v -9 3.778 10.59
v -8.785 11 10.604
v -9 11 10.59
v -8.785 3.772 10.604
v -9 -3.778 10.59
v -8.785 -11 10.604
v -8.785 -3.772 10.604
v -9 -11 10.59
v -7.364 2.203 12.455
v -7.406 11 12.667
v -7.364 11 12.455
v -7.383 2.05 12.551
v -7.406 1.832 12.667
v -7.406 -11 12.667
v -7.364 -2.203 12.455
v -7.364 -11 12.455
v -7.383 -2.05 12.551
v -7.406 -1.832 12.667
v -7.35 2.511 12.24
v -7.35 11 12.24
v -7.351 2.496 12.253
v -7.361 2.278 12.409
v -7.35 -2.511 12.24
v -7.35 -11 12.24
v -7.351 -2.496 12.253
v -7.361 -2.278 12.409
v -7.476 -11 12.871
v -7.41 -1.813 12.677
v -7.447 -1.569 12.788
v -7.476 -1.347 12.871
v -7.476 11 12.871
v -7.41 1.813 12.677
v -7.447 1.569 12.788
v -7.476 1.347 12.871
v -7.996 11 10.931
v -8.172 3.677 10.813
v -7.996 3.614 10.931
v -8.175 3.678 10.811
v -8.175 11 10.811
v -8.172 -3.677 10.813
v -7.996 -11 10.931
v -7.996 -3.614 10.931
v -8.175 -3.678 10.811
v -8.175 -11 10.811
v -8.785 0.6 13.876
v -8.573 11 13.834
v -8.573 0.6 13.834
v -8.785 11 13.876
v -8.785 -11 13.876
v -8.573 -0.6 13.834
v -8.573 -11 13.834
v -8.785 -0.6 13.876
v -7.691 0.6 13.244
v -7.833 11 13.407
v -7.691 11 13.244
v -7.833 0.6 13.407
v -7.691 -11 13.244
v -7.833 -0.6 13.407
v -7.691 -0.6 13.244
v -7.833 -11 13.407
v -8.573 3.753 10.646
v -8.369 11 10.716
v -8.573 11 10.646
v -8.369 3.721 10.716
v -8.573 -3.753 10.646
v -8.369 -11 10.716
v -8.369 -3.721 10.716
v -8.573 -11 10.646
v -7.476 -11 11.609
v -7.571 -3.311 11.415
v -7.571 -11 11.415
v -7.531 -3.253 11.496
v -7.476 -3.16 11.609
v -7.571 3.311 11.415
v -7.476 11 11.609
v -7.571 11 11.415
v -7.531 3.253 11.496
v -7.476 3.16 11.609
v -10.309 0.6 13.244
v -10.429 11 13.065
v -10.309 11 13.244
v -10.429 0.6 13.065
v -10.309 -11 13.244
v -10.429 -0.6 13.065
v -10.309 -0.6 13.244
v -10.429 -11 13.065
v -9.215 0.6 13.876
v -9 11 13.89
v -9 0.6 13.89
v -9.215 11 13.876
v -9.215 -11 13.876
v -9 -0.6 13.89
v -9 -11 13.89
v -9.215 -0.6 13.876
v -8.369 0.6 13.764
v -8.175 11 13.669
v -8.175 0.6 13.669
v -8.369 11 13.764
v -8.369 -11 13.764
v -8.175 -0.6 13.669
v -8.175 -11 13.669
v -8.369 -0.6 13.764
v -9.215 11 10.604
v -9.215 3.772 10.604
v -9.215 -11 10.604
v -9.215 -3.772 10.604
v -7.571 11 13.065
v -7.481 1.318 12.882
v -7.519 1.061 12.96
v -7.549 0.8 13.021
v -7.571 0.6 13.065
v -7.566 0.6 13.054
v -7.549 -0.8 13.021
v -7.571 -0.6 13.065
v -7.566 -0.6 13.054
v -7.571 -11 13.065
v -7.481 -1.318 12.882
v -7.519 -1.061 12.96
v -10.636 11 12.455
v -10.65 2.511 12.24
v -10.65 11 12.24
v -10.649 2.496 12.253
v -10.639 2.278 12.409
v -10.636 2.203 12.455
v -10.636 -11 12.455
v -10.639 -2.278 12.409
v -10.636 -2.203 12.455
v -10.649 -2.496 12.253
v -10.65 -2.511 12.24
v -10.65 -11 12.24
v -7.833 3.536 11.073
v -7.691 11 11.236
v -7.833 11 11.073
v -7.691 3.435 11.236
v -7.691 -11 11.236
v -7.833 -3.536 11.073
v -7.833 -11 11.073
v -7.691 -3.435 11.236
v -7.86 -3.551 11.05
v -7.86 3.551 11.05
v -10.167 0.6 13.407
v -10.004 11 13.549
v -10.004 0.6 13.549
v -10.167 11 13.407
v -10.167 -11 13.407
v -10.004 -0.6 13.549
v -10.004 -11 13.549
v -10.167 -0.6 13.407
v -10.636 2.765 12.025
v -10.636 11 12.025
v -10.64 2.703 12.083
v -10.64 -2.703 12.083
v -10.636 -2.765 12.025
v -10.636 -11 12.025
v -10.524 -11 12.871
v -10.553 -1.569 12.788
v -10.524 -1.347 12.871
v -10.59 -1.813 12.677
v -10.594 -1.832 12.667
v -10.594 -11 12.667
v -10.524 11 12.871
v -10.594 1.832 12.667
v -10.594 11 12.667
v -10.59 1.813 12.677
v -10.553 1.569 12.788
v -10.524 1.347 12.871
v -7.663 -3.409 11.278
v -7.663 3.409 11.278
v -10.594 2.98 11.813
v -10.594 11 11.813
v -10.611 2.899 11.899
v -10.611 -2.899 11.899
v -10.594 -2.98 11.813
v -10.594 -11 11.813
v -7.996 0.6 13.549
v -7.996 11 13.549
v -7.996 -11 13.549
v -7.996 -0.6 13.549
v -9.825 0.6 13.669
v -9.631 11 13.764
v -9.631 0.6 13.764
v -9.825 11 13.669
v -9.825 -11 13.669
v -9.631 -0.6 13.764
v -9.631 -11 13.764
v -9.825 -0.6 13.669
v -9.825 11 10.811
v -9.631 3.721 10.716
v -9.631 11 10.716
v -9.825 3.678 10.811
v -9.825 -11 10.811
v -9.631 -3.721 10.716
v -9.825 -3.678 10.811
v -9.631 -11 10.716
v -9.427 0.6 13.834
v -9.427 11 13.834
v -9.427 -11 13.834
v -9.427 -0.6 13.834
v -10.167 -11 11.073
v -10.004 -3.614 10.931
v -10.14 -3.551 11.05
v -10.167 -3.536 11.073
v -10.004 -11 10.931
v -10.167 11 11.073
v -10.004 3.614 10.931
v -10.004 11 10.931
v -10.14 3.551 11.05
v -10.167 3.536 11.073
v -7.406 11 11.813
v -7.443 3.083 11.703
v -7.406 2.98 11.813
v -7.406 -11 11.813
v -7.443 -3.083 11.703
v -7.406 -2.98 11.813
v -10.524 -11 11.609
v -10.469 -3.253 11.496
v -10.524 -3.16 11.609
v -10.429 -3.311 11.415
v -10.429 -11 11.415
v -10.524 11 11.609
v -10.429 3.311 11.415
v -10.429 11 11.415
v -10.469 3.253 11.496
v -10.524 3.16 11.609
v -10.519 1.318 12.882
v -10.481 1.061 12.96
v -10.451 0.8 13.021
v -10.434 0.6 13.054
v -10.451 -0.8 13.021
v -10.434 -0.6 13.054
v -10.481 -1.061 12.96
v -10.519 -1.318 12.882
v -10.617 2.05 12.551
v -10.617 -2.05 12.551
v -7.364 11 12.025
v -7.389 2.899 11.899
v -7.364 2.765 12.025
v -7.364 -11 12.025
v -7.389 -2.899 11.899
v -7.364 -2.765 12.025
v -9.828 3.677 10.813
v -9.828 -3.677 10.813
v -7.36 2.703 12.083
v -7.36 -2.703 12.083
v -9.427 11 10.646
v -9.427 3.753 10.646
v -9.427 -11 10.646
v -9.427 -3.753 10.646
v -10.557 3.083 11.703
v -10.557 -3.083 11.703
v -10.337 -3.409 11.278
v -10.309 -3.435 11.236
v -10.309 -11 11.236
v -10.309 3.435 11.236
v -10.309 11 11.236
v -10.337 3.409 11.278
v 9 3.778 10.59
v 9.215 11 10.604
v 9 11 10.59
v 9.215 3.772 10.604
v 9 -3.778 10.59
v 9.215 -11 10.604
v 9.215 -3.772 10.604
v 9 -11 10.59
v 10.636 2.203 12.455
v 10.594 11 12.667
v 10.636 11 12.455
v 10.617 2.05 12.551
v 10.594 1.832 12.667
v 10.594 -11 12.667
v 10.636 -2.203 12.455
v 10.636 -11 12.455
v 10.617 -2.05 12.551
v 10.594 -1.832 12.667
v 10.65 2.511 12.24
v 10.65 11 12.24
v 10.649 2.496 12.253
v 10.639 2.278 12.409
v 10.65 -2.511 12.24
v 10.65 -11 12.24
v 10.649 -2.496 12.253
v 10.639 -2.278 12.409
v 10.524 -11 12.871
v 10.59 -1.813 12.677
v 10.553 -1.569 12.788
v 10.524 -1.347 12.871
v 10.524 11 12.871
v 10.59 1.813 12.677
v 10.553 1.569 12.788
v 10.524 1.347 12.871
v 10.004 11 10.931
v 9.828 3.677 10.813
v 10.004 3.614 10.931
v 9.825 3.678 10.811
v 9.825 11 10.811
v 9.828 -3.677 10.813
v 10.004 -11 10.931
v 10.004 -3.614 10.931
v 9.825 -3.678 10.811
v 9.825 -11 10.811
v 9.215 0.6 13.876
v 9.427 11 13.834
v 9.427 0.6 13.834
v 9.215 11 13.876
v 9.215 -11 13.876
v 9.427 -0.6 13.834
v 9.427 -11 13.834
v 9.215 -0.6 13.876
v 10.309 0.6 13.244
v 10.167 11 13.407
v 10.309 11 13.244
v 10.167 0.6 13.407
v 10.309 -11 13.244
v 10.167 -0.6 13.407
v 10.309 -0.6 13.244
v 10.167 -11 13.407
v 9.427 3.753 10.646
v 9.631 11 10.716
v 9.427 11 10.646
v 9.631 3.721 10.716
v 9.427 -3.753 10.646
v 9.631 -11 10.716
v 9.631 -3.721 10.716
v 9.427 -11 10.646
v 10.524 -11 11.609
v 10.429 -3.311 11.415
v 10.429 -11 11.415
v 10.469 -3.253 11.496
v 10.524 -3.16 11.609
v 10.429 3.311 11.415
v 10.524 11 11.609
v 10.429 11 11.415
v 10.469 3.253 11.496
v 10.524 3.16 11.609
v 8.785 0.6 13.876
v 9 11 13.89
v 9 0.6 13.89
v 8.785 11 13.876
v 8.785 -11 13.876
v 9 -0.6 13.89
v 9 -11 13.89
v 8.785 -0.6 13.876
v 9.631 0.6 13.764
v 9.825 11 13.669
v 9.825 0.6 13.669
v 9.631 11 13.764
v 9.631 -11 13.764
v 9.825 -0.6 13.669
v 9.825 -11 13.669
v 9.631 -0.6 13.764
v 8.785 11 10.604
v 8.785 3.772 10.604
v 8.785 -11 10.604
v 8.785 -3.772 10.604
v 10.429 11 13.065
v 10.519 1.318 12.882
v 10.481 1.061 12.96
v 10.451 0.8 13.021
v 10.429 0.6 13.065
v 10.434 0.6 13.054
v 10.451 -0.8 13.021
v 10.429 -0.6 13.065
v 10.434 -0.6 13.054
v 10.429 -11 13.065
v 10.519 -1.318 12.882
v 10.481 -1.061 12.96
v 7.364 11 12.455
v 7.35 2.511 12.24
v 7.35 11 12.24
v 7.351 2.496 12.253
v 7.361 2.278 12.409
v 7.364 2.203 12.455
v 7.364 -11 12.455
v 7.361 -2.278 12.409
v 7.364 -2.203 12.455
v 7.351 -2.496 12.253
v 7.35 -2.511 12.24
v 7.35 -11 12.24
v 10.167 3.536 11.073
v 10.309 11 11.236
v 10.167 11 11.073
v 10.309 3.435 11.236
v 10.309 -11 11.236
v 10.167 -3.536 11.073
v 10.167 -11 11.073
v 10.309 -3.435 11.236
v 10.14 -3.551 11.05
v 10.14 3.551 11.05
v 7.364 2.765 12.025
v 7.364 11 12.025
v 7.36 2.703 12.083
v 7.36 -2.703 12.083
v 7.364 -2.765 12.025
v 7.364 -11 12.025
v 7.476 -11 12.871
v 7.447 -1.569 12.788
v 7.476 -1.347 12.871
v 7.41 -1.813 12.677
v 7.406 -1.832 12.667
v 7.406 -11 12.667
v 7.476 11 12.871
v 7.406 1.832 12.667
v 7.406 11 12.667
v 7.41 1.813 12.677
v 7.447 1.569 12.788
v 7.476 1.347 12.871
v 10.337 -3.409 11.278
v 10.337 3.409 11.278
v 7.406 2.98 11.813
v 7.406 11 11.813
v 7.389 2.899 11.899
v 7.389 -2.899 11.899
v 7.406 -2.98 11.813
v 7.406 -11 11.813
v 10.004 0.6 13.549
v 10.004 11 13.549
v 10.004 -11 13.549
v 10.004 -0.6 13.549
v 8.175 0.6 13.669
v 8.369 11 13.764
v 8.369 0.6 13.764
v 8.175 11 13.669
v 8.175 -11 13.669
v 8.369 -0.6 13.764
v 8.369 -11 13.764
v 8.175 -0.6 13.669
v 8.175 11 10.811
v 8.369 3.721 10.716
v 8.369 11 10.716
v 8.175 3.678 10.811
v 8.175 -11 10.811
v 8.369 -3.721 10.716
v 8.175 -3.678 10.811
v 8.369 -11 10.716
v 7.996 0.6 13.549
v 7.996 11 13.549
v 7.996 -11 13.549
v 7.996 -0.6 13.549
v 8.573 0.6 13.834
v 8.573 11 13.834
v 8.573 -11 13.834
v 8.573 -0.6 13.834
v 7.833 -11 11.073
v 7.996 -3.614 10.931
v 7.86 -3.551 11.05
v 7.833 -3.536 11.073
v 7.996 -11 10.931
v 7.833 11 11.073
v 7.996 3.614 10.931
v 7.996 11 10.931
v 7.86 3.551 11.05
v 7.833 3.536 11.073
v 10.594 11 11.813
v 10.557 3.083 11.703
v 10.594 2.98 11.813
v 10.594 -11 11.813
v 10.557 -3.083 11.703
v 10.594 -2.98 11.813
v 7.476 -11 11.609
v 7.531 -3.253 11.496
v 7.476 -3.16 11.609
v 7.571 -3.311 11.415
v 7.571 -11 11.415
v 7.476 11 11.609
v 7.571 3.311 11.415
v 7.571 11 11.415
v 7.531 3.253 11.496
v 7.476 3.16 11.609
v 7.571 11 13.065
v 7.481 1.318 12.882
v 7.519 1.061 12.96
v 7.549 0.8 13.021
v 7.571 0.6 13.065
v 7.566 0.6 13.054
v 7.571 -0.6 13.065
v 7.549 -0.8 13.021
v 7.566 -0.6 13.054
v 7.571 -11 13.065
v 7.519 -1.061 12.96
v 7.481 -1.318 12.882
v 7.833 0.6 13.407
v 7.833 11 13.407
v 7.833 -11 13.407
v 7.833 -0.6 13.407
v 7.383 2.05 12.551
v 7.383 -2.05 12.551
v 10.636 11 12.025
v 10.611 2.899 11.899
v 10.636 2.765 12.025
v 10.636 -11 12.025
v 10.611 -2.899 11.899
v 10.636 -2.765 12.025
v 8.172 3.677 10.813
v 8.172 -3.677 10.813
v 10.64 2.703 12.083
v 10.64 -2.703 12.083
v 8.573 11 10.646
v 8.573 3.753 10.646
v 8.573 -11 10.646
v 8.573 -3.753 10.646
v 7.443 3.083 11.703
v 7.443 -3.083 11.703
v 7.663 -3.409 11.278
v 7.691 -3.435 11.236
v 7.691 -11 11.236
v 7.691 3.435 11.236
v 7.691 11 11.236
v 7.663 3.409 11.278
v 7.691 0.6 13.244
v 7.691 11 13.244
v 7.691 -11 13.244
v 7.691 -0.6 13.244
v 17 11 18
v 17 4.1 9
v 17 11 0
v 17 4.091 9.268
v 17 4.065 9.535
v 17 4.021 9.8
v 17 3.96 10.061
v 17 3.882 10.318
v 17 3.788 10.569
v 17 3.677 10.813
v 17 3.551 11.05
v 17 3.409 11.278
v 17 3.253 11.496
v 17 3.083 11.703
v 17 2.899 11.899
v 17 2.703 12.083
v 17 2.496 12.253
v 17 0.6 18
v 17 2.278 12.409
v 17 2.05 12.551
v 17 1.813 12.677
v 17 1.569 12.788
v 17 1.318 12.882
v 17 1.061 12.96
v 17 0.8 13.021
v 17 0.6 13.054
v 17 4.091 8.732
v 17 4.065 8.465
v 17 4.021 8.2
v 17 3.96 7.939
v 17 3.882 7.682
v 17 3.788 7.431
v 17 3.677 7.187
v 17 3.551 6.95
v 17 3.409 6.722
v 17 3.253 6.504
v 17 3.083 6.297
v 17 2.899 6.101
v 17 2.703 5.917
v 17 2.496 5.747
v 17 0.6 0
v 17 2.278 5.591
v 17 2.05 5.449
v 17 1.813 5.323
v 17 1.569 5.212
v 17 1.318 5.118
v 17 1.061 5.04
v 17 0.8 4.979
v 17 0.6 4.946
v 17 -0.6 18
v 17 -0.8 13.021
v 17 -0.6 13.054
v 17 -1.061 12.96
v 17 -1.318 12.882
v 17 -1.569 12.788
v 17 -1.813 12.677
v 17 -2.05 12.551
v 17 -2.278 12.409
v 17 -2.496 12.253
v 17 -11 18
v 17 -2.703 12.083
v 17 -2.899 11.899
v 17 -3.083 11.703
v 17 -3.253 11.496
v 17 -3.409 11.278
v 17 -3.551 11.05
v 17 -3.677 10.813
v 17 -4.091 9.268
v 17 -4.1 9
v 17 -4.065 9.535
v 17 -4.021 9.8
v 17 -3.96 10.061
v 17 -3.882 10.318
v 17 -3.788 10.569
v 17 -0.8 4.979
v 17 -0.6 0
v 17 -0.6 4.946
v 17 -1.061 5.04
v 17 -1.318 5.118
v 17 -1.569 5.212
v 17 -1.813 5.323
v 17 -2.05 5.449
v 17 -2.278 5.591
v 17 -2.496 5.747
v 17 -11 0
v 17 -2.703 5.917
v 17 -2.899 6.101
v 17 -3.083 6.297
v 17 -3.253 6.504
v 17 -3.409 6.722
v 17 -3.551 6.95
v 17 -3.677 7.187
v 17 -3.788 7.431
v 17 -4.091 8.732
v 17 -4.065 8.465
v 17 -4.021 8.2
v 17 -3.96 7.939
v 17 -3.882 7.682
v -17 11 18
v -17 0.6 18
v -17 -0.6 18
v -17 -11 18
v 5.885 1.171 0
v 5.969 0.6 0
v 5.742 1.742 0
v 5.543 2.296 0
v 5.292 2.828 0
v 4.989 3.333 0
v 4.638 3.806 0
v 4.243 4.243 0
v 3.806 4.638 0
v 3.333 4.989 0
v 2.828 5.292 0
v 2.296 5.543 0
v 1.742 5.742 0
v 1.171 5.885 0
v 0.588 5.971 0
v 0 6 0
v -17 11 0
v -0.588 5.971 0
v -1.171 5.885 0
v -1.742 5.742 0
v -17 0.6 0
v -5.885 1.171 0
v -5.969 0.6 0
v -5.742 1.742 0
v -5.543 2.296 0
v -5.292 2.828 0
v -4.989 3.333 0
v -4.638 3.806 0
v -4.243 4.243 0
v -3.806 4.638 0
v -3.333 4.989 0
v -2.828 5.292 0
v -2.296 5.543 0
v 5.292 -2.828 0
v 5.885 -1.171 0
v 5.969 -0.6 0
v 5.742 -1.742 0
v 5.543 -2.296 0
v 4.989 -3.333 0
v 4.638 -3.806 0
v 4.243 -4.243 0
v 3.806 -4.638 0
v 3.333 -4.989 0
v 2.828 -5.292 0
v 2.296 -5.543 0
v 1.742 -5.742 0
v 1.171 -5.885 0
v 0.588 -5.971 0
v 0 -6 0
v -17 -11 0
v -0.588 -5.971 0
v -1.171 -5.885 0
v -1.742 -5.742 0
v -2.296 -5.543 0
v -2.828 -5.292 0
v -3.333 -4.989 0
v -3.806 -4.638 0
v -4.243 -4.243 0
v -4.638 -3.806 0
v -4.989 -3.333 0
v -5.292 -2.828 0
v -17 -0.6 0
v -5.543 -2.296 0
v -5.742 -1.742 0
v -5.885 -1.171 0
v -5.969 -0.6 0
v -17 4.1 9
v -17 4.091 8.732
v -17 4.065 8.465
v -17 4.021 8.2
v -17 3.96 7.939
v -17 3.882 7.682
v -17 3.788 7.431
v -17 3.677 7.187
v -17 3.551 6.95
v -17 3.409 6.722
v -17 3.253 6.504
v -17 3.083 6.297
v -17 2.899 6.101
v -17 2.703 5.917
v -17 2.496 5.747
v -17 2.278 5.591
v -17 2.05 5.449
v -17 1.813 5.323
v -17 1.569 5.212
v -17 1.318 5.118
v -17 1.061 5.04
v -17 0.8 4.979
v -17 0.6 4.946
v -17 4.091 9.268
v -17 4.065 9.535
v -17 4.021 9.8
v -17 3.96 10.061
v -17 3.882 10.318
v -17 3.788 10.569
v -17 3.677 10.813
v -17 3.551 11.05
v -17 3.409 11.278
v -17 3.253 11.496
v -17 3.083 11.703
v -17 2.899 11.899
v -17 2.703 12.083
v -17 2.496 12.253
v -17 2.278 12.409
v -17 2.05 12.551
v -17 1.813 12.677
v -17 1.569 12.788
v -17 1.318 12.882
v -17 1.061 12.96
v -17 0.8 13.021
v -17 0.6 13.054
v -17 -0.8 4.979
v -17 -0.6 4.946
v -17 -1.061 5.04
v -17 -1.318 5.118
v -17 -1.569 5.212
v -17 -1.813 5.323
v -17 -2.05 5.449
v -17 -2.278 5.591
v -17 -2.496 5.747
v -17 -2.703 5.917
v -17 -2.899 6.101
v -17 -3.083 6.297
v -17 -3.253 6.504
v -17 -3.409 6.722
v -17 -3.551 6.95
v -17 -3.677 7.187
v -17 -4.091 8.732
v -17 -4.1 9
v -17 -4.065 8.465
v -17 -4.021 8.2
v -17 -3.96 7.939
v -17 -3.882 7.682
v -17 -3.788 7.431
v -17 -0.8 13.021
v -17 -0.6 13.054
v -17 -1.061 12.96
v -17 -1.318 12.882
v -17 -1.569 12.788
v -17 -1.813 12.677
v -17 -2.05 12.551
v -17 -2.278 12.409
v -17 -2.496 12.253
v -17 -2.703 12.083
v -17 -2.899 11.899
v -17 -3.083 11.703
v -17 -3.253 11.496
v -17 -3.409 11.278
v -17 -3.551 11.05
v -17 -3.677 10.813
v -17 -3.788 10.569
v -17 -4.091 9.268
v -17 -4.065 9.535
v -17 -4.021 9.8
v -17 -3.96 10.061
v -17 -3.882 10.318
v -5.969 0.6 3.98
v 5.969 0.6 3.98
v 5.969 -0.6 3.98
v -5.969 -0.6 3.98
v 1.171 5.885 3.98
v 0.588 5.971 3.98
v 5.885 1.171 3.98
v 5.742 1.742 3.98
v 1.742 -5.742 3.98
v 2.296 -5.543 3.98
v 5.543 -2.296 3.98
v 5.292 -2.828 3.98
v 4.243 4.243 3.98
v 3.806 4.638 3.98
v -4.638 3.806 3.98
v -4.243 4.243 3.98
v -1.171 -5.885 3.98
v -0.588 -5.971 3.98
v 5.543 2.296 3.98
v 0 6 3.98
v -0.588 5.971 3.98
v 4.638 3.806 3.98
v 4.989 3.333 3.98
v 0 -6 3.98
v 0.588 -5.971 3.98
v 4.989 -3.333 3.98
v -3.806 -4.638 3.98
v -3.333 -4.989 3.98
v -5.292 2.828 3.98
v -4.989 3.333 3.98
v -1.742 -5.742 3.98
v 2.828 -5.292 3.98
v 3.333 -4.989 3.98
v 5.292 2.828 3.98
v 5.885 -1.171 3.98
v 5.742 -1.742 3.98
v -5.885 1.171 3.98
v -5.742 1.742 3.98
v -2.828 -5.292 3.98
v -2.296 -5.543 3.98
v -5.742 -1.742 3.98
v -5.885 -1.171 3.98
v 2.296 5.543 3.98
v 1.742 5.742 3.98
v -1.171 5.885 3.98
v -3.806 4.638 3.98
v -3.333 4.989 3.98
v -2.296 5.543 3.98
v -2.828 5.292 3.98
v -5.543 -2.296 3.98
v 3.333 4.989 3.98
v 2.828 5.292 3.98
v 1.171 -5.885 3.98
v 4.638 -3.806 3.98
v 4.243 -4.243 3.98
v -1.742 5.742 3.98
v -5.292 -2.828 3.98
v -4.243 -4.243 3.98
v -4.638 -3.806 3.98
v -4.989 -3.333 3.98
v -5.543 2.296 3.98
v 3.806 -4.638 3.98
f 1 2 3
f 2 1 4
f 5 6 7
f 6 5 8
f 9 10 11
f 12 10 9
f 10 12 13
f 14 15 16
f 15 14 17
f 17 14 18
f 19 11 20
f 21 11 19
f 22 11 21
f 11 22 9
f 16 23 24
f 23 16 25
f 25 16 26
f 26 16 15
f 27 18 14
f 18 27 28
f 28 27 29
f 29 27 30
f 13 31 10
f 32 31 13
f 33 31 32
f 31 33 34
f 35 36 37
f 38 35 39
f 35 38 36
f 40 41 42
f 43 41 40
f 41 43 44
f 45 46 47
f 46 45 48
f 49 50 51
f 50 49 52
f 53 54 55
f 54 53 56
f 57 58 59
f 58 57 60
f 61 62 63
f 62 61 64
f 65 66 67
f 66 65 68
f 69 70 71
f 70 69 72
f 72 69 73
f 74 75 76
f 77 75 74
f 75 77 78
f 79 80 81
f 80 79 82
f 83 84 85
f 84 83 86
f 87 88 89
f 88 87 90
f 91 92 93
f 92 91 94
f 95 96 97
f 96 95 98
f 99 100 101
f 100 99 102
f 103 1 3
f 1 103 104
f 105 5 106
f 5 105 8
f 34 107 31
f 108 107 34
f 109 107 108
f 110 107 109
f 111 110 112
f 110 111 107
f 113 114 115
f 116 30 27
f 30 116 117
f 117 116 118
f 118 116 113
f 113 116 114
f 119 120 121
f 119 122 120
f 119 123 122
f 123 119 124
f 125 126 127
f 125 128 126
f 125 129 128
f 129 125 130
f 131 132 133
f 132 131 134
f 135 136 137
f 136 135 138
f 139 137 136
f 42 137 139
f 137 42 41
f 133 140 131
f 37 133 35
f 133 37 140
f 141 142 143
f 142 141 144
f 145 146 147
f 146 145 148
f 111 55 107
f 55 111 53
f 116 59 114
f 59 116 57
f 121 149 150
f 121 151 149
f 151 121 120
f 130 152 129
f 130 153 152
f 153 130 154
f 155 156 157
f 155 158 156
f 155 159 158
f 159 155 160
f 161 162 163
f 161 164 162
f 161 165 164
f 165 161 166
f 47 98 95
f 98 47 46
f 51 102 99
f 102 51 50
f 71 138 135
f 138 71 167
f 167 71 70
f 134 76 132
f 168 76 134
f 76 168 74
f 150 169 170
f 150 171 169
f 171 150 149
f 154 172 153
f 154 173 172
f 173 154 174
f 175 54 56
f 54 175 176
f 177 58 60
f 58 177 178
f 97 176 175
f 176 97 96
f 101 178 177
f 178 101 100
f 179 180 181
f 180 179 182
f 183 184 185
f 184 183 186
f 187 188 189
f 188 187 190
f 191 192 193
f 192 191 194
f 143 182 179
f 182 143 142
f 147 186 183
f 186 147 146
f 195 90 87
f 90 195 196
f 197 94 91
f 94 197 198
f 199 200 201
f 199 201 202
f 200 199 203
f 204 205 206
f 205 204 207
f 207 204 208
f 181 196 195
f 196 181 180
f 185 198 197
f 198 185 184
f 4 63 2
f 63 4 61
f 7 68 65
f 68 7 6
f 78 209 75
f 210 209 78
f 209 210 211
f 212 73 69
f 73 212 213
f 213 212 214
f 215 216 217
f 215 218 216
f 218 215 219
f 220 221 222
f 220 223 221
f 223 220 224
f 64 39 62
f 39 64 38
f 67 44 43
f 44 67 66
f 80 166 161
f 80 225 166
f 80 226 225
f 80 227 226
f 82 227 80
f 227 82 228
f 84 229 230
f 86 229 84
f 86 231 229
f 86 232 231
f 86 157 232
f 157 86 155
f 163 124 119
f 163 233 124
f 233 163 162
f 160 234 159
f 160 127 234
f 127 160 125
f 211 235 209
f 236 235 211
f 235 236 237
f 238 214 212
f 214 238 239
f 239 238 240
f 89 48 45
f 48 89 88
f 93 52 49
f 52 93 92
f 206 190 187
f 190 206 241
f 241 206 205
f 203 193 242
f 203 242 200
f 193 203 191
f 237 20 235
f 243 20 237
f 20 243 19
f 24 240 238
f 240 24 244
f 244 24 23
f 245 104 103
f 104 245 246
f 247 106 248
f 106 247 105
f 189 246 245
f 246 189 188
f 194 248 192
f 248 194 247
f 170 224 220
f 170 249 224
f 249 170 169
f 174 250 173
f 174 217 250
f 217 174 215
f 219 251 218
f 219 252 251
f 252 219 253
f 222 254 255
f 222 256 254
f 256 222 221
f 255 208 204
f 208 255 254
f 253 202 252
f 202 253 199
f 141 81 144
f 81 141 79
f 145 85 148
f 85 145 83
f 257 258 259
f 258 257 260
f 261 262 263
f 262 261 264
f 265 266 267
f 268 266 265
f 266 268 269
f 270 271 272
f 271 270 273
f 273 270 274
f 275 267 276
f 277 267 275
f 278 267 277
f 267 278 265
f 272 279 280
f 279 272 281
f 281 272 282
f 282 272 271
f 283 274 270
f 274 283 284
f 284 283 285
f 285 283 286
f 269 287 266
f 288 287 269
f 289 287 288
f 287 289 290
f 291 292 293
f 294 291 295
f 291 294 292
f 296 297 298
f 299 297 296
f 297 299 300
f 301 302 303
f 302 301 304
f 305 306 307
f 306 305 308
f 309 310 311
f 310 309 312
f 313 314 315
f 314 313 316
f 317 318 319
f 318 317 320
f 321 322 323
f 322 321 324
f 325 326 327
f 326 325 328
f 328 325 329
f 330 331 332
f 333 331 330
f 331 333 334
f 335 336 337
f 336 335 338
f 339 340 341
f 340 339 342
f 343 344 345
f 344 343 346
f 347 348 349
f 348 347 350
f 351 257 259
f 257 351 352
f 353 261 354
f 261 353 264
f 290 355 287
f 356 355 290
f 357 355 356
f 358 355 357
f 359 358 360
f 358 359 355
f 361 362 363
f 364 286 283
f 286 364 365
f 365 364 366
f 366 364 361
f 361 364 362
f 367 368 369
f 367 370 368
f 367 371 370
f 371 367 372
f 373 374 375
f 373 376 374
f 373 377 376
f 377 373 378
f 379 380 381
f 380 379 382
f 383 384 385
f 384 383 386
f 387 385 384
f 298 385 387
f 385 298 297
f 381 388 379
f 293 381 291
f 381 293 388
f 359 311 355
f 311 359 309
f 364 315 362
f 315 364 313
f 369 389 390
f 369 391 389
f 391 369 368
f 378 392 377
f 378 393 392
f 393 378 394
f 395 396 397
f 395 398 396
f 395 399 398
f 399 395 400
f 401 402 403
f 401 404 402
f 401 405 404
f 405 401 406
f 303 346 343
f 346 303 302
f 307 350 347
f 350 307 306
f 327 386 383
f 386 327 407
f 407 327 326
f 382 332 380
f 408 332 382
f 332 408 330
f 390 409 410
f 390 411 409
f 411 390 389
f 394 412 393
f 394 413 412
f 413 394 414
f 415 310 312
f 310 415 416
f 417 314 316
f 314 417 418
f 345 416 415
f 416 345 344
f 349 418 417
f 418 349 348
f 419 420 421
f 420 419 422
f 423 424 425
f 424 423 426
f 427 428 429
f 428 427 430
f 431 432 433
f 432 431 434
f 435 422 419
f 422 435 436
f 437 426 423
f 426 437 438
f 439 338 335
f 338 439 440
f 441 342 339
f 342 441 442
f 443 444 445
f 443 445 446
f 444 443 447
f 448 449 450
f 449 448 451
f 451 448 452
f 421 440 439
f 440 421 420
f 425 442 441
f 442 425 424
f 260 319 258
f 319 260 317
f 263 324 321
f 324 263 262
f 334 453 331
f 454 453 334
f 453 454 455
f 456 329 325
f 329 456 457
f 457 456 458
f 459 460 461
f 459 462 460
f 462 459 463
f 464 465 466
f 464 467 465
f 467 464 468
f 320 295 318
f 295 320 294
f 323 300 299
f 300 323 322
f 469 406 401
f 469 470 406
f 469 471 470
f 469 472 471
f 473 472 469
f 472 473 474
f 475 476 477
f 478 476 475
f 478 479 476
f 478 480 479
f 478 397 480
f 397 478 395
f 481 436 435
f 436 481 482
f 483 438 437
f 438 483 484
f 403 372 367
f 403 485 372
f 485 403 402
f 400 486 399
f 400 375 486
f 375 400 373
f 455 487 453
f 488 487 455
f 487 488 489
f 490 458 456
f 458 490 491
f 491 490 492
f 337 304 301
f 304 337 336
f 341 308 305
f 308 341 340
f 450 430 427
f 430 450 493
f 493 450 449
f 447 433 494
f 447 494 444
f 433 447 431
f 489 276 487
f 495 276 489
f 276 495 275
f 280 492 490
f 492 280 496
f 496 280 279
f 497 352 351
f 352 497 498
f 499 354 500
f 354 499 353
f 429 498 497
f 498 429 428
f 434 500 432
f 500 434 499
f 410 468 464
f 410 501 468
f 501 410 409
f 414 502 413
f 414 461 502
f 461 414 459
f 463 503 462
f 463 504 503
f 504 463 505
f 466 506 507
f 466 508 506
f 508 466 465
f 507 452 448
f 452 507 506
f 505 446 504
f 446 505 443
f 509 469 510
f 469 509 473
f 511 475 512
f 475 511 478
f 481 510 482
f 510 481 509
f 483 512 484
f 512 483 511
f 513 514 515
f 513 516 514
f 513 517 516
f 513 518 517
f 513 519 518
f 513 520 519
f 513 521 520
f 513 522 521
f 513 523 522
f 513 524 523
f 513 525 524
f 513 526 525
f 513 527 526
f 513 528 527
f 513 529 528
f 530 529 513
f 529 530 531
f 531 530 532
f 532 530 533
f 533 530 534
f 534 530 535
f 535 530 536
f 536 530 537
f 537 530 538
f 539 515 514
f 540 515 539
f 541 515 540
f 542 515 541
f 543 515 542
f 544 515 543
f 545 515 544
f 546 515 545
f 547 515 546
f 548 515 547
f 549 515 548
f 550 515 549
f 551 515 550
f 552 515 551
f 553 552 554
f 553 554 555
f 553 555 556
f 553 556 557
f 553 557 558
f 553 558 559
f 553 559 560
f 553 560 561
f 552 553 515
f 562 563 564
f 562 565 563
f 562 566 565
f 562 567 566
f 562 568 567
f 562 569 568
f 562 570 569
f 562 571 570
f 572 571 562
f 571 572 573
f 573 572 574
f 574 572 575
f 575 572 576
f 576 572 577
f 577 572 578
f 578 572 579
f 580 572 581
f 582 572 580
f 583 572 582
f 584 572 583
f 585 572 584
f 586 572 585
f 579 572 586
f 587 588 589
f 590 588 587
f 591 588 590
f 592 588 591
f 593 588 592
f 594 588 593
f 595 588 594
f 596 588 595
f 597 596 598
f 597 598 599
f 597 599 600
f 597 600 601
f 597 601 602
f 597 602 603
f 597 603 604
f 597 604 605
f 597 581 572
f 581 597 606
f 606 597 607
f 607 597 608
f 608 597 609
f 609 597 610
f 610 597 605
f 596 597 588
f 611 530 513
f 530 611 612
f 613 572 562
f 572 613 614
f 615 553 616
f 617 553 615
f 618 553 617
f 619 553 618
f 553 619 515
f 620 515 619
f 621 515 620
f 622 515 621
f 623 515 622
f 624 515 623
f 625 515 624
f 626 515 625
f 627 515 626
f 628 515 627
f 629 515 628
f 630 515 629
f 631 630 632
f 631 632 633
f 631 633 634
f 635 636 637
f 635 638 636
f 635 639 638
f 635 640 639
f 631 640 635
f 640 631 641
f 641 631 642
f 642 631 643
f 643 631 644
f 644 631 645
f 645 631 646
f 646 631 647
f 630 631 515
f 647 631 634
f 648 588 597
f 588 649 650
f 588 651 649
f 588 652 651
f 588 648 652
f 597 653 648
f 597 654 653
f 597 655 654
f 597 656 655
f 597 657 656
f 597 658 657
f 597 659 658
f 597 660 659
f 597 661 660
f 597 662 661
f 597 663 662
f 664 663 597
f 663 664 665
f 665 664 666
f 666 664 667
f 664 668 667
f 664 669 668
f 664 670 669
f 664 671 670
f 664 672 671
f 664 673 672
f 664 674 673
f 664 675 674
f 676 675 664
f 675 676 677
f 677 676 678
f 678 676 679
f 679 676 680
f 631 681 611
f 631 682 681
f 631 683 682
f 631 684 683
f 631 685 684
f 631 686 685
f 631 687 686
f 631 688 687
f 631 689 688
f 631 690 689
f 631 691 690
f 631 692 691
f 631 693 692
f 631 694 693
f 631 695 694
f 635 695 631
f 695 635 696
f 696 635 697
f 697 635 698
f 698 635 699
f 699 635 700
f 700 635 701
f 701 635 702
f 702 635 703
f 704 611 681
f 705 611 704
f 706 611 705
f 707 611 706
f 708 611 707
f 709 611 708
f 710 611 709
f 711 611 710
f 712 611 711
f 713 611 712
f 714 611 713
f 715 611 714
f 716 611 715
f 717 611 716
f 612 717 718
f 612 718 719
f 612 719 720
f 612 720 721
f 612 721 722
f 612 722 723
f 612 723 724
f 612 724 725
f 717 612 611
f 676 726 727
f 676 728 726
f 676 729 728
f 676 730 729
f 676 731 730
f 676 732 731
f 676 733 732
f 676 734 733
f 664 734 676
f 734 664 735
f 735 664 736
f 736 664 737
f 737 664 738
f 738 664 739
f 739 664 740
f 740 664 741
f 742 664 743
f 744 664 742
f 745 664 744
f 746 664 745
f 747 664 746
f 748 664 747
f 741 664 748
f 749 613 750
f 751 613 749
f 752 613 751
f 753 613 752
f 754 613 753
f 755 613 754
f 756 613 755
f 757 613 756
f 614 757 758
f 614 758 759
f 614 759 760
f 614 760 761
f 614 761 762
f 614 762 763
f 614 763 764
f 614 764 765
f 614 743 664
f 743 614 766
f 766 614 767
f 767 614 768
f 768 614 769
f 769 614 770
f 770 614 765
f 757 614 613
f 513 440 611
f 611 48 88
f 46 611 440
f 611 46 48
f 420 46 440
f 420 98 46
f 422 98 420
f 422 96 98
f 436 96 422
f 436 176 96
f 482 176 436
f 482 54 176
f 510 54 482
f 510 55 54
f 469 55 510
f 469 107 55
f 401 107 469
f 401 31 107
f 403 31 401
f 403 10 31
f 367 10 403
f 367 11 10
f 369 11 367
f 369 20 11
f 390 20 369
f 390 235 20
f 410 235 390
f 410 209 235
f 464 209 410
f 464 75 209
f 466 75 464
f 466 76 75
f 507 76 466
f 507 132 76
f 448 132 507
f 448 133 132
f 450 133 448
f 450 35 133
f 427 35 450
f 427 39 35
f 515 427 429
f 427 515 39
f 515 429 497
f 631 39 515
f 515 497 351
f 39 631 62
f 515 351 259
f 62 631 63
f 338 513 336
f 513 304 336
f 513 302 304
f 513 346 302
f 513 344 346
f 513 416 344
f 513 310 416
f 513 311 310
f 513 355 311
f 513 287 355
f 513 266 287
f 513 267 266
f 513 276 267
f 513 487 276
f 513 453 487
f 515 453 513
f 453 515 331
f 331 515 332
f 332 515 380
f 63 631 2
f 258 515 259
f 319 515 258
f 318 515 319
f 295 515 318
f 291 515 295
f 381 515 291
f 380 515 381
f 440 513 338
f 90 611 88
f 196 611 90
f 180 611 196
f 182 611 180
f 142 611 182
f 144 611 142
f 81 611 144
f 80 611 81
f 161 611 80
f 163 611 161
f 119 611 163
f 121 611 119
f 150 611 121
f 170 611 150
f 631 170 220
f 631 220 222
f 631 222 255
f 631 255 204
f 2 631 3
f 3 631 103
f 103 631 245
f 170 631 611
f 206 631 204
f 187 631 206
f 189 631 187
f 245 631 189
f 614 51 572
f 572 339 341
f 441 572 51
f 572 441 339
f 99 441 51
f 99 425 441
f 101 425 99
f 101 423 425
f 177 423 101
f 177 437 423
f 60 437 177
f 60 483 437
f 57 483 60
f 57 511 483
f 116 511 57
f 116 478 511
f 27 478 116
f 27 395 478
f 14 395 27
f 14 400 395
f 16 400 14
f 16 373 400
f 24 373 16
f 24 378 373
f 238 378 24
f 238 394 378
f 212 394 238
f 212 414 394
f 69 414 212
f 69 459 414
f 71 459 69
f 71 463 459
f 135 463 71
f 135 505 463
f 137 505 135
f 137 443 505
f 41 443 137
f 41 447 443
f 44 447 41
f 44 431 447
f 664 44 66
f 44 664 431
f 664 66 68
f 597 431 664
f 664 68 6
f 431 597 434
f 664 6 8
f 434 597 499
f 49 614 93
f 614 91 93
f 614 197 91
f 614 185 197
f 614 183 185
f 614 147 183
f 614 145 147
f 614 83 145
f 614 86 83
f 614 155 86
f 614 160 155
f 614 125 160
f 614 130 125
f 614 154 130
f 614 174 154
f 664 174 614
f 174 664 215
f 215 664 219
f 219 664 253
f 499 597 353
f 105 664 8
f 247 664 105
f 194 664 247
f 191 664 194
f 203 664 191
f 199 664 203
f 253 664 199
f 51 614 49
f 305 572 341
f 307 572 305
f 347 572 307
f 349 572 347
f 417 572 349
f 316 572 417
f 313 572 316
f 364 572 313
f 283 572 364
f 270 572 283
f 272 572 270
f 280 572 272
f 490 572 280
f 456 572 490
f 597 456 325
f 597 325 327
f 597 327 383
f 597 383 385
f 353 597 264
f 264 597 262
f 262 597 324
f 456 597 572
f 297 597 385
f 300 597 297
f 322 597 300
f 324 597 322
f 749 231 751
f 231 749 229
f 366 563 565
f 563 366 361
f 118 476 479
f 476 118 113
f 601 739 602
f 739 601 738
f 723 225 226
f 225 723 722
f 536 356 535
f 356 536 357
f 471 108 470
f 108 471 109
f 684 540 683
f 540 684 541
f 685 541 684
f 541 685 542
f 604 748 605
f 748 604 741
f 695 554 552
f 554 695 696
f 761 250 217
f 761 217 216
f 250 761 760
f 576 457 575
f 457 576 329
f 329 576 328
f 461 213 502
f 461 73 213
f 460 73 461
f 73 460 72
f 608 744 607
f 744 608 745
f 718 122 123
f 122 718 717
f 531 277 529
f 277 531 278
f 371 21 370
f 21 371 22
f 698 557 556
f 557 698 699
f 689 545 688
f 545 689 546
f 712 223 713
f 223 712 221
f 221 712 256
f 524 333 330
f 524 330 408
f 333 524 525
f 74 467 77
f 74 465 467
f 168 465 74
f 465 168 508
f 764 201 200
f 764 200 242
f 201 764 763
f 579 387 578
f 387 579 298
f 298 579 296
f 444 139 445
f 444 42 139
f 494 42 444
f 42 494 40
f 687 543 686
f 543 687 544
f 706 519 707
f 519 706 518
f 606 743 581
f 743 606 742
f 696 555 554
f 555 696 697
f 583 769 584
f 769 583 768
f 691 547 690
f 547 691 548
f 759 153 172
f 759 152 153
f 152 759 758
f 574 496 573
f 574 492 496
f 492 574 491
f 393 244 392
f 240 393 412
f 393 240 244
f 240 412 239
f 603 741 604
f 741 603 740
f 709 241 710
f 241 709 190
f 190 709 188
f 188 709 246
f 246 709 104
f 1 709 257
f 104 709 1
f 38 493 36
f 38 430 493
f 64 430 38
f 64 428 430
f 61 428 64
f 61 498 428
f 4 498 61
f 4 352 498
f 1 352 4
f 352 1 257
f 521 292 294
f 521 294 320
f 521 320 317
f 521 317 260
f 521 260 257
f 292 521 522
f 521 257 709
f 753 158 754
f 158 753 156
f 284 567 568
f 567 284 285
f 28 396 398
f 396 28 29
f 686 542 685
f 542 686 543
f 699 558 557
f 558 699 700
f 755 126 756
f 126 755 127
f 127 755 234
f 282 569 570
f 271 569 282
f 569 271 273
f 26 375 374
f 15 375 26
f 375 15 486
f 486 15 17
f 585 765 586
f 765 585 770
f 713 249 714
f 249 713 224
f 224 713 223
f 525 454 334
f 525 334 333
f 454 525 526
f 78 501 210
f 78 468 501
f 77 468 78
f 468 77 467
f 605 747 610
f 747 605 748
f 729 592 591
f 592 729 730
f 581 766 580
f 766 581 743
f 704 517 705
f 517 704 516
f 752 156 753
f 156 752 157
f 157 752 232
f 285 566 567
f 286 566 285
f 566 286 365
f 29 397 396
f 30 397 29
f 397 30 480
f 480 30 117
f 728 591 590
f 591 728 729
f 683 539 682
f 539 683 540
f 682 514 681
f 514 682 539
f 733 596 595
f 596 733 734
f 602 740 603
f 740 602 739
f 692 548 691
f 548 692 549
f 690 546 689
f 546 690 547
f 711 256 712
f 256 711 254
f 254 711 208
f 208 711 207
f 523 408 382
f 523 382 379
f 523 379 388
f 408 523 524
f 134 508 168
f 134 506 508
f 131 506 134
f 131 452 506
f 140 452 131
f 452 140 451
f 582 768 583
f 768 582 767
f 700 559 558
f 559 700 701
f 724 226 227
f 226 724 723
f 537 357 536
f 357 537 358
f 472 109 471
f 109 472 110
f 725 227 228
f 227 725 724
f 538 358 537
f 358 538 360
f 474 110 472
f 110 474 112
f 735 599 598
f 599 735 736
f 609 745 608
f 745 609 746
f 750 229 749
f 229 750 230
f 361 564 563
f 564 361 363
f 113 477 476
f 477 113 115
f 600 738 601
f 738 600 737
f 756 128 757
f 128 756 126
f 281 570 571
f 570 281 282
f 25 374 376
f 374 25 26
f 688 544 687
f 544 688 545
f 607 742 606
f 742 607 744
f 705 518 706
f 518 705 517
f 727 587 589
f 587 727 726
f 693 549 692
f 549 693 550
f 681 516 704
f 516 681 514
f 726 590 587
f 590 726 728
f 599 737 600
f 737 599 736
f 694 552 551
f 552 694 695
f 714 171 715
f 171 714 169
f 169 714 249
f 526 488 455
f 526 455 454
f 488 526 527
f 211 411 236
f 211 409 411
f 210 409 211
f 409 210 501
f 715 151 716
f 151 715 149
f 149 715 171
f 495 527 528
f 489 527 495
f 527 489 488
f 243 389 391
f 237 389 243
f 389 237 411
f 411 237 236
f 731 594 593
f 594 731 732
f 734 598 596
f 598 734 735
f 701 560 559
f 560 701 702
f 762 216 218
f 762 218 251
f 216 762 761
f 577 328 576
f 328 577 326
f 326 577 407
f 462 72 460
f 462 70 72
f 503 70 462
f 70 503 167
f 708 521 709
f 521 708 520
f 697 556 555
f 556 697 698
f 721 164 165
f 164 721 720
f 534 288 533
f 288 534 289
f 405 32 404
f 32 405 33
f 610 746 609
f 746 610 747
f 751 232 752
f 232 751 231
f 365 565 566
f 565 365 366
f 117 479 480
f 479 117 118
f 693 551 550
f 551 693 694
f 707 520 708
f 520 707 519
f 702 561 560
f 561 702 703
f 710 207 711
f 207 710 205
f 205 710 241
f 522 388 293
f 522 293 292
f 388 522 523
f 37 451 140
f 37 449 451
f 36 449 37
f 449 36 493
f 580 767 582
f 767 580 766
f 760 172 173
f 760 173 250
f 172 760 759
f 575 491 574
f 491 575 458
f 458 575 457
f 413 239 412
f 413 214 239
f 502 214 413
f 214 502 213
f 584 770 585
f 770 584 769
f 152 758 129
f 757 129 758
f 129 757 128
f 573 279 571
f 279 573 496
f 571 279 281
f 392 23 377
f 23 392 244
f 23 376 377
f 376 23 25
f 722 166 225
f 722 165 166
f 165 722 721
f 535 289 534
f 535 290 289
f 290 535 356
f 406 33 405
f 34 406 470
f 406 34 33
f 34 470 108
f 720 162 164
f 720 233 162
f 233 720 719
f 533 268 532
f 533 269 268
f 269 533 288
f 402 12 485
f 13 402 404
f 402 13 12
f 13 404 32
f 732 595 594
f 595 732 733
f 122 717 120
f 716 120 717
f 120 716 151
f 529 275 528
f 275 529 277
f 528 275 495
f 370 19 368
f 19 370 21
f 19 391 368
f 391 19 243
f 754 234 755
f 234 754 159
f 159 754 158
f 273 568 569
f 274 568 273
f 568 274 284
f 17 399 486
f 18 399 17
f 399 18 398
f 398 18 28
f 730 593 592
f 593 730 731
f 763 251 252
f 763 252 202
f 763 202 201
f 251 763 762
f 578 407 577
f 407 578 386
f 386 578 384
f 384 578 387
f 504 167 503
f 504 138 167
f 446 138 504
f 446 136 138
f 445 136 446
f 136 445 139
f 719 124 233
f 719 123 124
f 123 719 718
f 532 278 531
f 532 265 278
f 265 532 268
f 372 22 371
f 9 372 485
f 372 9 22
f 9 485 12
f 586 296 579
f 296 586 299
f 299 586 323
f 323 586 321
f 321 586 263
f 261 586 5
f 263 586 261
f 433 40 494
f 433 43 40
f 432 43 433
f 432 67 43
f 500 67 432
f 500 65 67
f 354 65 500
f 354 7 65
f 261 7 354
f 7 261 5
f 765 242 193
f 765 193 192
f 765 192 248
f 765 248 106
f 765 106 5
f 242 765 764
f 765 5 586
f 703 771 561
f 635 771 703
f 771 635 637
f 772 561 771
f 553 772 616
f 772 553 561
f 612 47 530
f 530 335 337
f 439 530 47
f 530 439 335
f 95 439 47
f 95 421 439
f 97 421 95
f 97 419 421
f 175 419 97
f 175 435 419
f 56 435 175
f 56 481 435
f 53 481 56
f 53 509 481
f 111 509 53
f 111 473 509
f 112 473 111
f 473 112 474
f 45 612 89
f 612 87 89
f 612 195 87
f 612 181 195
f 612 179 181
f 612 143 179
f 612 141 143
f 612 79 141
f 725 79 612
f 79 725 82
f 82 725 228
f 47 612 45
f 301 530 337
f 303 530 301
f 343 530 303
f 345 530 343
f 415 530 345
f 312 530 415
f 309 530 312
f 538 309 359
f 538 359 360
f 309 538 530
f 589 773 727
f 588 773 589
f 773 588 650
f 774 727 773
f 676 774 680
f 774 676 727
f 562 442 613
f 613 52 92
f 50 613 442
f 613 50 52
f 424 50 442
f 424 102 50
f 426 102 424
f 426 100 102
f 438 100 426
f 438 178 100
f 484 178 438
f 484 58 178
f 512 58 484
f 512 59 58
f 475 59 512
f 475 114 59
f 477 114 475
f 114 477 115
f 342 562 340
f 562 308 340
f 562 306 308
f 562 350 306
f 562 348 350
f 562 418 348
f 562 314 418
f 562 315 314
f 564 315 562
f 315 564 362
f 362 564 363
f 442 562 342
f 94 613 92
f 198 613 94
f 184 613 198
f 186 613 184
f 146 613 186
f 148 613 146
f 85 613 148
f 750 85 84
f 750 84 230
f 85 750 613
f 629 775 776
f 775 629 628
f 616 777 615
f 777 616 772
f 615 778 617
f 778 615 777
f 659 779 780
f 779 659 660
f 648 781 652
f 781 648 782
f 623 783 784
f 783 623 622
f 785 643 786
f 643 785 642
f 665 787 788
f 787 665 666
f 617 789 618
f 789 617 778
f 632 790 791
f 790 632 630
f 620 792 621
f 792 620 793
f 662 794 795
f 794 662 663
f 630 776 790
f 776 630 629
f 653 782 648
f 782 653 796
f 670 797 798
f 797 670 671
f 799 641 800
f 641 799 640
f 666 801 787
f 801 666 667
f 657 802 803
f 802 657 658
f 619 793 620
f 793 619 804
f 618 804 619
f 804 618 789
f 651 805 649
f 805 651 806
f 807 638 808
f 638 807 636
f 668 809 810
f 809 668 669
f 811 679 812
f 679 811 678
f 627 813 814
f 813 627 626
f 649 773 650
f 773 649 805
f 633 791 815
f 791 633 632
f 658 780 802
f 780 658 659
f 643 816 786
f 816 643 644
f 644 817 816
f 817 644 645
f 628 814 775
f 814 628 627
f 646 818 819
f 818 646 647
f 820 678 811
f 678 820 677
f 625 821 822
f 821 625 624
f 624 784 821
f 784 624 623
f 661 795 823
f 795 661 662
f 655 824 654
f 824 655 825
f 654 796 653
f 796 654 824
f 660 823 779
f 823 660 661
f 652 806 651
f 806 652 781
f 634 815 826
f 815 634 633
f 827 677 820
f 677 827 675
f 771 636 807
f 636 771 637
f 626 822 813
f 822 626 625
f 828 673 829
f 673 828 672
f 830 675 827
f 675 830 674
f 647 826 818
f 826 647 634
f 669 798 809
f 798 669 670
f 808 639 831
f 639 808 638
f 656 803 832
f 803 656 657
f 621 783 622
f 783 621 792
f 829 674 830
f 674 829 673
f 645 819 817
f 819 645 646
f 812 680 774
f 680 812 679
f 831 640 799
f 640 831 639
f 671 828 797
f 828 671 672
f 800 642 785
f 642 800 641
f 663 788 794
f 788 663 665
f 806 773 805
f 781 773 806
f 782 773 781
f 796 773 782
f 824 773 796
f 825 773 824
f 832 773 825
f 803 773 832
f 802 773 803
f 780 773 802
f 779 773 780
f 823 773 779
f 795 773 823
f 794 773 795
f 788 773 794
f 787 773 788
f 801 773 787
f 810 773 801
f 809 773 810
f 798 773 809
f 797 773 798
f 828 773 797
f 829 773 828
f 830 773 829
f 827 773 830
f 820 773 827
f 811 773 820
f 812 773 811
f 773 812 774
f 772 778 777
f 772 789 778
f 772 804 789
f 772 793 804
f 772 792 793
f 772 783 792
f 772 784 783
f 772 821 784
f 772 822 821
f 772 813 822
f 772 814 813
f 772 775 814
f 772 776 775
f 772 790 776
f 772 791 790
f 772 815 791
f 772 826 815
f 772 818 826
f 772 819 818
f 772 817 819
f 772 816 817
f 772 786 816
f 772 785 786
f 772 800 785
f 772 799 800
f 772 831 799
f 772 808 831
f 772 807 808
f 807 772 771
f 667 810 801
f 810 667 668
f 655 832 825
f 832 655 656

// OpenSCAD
// file: _common.scad
// Parametros comunes del mini heliostato.

$fn = 96;

eps = 0.02;

bearing_608_od = 22;
bearing_608_id = 8;
bearing_608_width = 7;

shaft_d = 8;
shaft_clearance = 0.2;

m3_clearance = 3.3;
m4_clearance = 4.3;

gt2_pitch = 2;
gt2_belt_width = 6;

module rounded_box(size = [10, 10, 10], r = 2) {
    hull() {
        for (x = [r, size[0] - r])
        for (y = [r, size[1] - r])
        for (z = [r, size[2] - r])
            translate([x, y, z]) sphere(r = r, $fn = 24);
    }
}

module screw_hole_x(d = m3_clearance, length = 20) {
    rotate([0, 90, 0])
        cylinder(d = d, h = length, center = true, $fn = 48);
}

module screw_hole_y(d = m3_clearance, length = 20) {
    rotate([90, 0, 0])
        cylinder(d = d, h = length, center = true, $fn = 48);
}

module shaft_hole_x(d = shaft_d + shaft_clearance, length = 40) {
    rotate([0, 90, 0])
        cylinder(d = d, h = length, center = true, $fn = 96);
}
// main file
include <_common.scad>

// Abrazadera partida para eje de 8 mm.
// Objetivo: comprobar bore, ranura y fuerza de apriete con dos tornillos M3.

body = [34, 22, 18];
bore_d = 8.2;
slit_w = 1.2;
screw_spacing = 18;

difference() {
    translate([-body[0] / 2, -body[1] / 2, 0])
        cube(body);

    // Paso del eje.
    translate([0, 0, body[2] / 2])
        shaft_hole_x(d = bore_d, length = body[0] + 2);

    // Ranura de apriete.
    translate([-body[0] / 2 - eps, -slit_w / 2, 0])
        cube([body[0] + 2 * eps, slit_w, body[2] + eps]);

    // Tornillos de apriete M3, perpendiculares a la ranura.
    for (x = [-screw_spacing / 2, screw_spacing / 2]) {
        translate([x, 0, body[2] * 0.68])
            screw_hole_y(d = m3_clearance, length = body[1] + 2);
    }

    // Aligeramiento inferior.
    translate([0, 0, -eps])
        cylinder(d = 12, h = 4, $fn = 64);
}
